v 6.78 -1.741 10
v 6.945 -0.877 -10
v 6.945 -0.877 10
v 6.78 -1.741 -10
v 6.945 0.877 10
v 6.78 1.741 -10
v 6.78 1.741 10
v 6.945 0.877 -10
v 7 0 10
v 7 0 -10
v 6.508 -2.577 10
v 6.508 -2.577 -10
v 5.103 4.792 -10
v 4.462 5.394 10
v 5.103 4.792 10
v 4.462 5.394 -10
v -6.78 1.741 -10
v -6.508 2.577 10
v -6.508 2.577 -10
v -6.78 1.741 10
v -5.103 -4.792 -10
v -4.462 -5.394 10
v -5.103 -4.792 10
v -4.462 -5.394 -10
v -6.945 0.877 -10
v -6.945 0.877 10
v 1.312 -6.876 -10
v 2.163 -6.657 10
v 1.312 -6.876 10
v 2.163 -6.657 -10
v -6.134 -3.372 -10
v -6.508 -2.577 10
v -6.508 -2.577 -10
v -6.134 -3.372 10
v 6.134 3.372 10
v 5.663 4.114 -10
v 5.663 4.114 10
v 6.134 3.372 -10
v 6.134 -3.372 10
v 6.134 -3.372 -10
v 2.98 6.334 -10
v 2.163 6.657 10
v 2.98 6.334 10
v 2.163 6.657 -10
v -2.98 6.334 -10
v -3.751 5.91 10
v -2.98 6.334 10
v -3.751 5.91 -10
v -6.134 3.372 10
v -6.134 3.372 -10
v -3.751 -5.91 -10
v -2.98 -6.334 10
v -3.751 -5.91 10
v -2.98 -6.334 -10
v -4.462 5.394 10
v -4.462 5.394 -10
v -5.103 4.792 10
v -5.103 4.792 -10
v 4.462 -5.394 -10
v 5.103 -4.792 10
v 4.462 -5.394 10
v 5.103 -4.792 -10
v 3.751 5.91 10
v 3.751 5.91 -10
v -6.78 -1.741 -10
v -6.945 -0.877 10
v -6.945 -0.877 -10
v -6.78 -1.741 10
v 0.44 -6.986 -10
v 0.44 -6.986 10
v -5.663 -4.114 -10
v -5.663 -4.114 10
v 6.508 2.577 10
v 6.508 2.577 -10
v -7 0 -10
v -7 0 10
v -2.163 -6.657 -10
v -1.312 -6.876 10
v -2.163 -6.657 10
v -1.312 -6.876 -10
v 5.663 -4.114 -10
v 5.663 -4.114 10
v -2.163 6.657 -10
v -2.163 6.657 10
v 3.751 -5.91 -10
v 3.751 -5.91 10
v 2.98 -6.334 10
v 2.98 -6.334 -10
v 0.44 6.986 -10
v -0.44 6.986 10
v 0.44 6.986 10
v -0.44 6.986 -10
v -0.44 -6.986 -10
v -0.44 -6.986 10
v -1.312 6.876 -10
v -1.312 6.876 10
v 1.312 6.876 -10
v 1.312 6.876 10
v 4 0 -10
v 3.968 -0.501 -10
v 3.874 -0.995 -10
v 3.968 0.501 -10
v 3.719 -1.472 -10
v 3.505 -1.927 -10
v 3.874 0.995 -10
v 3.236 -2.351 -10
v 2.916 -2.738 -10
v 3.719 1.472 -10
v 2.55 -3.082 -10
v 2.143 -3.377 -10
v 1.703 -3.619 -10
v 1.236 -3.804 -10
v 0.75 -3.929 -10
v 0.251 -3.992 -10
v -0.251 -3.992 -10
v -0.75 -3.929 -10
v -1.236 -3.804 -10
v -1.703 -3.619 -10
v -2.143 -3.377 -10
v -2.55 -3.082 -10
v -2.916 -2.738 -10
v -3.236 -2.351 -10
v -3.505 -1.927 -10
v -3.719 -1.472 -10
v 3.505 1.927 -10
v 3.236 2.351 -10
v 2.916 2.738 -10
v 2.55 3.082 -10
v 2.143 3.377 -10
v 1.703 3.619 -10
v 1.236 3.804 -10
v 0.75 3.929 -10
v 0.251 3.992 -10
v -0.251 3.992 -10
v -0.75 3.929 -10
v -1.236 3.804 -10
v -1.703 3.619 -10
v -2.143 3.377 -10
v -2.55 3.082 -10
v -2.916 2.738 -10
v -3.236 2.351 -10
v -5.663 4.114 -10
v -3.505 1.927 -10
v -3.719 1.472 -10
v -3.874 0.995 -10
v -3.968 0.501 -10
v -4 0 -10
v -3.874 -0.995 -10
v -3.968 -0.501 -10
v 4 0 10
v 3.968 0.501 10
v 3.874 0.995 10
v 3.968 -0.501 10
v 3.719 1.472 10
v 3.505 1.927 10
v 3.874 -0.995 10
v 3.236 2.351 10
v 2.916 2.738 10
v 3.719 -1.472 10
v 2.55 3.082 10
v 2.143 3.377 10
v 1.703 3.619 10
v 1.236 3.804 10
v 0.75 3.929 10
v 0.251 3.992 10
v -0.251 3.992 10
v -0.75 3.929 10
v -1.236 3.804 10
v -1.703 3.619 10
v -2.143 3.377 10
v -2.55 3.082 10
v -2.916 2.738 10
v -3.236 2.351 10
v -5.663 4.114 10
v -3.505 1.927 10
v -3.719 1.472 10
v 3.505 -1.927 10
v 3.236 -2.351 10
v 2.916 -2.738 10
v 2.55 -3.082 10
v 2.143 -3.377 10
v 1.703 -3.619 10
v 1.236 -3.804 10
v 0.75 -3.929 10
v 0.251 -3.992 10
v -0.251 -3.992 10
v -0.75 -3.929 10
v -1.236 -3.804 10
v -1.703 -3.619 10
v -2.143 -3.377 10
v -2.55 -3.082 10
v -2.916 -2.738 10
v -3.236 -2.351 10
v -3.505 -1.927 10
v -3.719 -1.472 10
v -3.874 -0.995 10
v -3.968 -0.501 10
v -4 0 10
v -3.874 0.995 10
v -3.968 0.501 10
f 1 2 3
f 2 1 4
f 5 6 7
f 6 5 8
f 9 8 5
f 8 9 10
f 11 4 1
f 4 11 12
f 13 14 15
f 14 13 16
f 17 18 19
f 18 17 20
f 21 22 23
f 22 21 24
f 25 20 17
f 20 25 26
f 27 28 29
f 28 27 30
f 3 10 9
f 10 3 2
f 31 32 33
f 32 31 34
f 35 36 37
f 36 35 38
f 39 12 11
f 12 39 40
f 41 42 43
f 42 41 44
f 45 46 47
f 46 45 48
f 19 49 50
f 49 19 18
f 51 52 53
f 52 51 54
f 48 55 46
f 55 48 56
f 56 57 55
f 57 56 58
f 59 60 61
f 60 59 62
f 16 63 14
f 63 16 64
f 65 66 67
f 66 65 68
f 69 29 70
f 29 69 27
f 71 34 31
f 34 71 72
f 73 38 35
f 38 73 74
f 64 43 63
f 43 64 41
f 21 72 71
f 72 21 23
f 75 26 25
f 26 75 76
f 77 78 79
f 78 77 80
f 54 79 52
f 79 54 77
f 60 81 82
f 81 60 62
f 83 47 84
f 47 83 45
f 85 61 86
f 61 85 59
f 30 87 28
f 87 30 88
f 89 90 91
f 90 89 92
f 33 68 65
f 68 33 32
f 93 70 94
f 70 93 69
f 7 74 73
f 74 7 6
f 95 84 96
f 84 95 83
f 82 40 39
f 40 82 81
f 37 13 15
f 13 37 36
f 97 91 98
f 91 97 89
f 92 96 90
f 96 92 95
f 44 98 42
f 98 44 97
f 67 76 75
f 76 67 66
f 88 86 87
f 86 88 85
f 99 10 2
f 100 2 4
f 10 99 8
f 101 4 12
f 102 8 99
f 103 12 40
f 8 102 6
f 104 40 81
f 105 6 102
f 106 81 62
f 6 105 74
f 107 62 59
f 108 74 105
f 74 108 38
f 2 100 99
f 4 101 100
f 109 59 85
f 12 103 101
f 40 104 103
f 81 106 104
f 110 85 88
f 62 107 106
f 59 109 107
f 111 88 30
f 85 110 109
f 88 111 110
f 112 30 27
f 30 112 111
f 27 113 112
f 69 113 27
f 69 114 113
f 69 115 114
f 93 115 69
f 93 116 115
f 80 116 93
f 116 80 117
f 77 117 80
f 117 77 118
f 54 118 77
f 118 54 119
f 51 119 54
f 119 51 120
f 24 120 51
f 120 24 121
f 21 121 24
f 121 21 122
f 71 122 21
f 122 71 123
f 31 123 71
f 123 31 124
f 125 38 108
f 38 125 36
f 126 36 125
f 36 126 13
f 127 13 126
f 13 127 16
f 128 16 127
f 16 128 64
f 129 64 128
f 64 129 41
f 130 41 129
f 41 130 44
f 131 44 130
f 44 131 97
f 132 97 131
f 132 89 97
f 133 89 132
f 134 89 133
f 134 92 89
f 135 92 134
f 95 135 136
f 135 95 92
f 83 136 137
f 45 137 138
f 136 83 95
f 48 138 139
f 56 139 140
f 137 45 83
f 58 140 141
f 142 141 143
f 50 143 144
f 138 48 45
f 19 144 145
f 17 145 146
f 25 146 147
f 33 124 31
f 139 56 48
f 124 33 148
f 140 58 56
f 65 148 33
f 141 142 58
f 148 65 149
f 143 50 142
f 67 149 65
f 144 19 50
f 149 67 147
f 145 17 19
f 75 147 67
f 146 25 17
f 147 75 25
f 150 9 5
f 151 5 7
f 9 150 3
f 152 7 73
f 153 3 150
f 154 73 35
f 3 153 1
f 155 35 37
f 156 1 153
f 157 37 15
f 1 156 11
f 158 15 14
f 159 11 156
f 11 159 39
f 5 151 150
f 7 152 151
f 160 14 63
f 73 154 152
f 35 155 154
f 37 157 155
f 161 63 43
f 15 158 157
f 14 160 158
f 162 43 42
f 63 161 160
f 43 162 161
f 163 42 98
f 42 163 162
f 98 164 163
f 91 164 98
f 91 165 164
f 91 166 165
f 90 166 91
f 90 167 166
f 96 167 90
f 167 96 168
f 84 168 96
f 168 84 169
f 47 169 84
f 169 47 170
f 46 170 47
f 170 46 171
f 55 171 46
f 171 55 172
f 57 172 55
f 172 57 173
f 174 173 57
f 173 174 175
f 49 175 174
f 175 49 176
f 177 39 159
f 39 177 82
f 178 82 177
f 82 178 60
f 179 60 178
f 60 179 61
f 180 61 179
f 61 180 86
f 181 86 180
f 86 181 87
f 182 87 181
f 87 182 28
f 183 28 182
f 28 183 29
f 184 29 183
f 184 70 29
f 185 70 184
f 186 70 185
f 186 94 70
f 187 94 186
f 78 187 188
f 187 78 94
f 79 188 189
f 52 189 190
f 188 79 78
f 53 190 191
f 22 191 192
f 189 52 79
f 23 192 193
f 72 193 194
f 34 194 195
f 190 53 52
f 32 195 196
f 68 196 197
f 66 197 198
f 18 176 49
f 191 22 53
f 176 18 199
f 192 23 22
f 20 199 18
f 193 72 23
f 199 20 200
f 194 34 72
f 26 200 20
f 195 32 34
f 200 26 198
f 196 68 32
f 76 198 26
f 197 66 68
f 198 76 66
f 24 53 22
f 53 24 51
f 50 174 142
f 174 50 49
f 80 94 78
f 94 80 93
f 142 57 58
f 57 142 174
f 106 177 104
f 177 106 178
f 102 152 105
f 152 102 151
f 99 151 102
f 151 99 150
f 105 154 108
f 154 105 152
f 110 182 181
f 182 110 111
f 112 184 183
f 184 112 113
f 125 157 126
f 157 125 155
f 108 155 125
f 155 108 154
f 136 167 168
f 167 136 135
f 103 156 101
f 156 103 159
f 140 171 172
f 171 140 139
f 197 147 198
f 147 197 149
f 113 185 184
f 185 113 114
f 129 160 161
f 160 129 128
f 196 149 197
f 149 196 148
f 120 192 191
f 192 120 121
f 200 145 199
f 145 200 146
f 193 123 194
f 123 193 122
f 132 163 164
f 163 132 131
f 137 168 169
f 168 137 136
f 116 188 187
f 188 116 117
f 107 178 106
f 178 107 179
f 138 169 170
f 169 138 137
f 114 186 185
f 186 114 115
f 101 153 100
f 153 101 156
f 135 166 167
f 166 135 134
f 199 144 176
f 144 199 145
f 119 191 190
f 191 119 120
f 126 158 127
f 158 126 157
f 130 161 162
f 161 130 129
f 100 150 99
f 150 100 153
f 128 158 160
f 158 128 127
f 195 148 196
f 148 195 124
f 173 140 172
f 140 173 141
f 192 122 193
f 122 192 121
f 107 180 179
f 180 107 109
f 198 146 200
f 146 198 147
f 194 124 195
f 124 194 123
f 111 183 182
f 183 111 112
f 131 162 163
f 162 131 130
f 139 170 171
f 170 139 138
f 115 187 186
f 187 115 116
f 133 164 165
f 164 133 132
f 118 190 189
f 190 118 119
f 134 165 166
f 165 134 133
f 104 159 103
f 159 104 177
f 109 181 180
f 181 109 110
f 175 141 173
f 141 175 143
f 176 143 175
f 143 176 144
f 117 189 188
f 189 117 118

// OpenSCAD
$fn = 50;


difference() {
	union() {
		translate(v = [0, 0, -10.0000000000]) {
			cylinder(h = 20, r = 7.0000000000);
		}
	}
	union() {
		translate(v = [0, 0, -100.0000000000]) {
			cylinder(h = 200, r = 4.0000000000);
		}
	}
}
